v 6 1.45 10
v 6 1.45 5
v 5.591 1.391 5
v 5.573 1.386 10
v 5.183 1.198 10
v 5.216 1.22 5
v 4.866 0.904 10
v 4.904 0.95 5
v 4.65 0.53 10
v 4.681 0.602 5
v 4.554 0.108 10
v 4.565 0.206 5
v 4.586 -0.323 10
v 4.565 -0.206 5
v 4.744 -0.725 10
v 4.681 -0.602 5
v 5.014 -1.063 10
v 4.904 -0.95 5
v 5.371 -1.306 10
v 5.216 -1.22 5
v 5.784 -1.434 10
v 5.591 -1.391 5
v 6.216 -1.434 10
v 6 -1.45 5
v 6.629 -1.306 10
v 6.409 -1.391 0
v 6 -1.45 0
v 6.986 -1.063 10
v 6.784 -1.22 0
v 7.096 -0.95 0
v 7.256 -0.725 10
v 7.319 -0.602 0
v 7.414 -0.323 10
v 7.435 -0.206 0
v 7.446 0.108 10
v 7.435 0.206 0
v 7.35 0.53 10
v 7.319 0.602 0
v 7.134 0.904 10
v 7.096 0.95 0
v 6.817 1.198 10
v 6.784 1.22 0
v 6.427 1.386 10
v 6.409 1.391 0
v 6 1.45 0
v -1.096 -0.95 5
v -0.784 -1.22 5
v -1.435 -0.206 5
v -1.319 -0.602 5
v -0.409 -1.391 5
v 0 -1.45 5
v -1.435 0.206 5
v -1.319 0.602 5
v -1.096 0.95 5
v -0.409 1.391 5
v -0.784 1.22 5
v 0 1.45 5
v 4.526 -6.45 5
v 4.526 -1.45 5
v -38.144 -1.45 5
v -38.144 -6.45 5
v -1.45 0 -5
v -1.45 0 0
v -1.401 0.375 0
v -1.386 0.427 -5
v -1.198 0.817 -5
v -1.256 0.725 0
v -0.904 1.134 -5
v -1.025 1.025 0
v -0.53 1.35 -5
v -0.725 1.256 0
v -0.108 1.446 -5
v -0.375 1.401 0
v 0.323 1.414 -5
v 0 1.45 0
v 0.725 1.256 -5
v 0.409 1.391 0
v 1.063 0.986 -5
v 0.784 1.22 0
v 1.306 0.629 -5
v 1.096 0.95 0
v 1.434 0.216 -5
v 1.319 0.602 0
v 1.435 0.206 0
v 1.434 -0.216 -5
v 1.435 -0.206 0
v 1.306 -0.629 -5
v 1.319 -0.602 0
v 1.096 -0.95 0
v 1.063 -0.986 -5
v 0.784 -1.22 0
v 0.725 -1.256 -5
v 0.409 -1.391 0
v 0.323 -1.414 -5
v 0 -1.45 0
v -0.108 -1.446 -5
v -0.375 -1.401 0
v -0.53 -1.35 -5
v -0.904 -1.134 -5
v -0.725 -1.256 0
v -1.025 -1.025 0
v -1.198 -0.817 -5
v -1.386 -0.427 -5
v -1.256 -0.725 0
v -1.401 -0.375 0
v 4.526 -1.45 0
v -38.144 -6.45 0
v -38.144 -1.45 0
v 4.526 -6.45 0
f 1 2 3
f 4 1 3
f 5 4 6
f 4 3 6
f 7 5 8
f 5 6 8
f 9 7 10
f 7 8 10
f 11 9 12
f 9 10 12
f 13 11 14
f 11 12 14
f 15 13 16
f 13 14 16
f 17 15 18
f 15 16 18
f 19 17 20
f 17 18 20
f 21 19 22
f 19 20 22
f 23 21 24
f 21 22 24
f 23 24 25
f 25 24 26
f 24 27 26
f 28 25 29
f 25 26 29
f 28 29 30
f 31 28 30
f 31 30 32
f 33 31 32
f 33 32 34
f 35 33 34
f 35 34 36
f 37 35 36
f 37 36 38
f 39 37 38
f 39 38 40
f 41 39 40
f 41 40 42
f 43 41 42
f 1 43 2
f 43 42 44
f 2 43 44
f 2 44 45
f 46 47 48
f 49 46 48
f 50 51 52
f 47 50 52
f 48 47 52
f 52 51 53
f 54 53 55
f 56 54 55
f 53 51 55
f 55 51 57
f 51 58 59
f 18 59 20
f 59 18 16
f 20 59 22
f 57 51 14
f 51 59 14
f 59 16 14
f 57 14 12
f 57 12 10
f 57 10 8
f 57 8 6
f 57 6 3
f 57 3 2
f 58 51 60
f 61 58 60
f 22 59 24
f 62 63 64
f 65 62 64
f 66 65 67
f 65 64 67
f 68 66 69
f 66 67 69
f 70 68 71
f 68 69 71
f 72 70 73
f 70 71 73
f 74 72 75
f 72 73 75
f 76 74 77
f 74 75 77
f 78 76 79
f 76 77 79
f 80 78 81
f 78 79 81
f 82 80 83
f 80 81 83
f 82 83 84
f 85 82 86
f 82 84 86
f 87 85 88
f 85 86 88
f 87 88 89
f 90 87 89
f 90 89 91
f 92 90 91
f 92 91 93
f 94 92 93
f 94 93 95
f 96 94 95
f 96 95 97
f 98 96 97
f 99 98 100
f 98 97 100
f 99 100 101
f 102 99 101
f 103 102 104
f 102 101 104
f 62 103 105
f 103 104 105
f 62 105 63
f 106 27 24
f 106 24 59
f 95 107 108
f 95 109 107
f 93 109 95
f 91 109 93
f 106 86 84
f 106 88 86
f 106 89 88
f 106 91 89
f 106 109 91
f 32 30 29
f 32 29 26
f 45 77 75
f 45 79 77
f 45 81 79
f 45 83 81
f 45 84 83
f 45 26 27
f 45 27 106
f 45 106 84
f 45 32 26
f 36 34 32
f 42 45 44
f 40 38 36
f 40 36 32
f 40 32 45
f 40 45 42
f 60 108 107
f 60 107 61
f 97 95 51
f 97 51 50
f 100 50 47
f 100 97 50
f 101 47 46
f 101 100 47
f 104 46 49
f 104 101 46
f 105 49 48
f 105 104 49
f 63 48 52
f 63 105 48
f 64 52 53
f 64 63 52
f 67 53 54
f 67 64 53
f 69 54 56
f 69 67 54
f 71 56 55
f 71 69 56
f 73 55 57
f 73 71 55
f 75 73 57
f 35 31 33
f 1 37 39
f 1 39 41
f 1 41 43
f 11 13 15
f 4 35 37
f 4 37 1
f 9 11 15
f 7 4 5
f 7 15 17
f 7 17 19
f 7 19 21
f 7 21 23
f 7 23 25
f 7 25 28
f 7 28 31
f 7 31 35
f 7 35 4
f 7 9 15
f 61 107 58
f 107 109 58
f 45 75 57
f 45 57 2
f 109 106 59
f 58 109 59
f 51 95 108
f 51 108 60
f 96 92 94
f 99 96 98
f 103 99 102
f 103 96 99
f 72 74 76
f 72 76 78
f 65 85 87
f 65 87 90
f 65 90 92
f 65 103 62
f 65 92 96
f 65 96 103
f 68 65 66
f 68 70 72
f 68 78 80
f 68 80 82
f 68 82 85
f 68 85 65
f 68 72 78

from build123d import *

# Parameters (mm, degrees)
EXTRUDE_1_DEPTH = 5
SKETCH_2_R      = 1.45
EXTRUDE_2_DEPTH = 5
SKETCH_3_R      = 1.45
EXTRUDE_3_DEPTH = 5
SKETCH_4_W      = 2.670391159
SKETCH_4_H      = 5
EXTRUDE_4_DEPTH = 5
SKETCH_5_W      = 5
SKETCH_5_H      = 5
EXTRUDE_5_DEPTH = 40


with BuildPart() as part:
    # 草图1 → 凸台-拉伸1 (new body)
    with BuildSketch(Plane.XY):
        with BuildLine():
            Line((0, 1.45), (6, 1.45))
            ThreePointArc((6, 1.45), (7.45, 0), (6, -1.45))
            Line((6, -1.45), (0, -1.45))
            ThreePointArc((0, -1.45), (-1.45, 0), (0, 1.45))
        make_face()
    extrude(amount=EXTRUDE_1_DEPTH)

    # 草图2 → 凸台-拉伸2 (add)
    with BuildSketch(Plane.XY.offset(5)):
        with Locations(Location((6, 0, 0), (0, 0, 90))):
            Circle(SKETCH_2_R)
    extrude(amount=EXTRUDE_2_DEPTH)

    # 草图3 → 凸台-拉伸3 (add)
    with BuildSketch(Plane(origin=(0, 0, 0), x_dir=(-1, 0, 0), z_dir=(0, 0, -1))):
        Circle(SKETCH_3_R)
    extrude(amount=EXTRUDE_3_DEPTH)

    # 草图4 → 凸台-拉伸4 (add)
    with BuildSketch(Plane.XZ.offset(1.45)):
        with Locations((3.190742226, 2.5)):
            Rectangle(SKETCH_4_W, SKETCH_4_H)
    extrude(amount=EXTRUDE_4_DEPTH)

    # 草图5 → 凸台-拉伸5 (add)
    with BuildSketch(Plane.ZY.offset(-1.855546646)):
        with Locations((2.5, -3.95)):
            Rectangle(SKETCH_5_W, SKETCH_5_H)
    extrude(amount=EXTRUDE_5_DEPTH)


solid = part.part
